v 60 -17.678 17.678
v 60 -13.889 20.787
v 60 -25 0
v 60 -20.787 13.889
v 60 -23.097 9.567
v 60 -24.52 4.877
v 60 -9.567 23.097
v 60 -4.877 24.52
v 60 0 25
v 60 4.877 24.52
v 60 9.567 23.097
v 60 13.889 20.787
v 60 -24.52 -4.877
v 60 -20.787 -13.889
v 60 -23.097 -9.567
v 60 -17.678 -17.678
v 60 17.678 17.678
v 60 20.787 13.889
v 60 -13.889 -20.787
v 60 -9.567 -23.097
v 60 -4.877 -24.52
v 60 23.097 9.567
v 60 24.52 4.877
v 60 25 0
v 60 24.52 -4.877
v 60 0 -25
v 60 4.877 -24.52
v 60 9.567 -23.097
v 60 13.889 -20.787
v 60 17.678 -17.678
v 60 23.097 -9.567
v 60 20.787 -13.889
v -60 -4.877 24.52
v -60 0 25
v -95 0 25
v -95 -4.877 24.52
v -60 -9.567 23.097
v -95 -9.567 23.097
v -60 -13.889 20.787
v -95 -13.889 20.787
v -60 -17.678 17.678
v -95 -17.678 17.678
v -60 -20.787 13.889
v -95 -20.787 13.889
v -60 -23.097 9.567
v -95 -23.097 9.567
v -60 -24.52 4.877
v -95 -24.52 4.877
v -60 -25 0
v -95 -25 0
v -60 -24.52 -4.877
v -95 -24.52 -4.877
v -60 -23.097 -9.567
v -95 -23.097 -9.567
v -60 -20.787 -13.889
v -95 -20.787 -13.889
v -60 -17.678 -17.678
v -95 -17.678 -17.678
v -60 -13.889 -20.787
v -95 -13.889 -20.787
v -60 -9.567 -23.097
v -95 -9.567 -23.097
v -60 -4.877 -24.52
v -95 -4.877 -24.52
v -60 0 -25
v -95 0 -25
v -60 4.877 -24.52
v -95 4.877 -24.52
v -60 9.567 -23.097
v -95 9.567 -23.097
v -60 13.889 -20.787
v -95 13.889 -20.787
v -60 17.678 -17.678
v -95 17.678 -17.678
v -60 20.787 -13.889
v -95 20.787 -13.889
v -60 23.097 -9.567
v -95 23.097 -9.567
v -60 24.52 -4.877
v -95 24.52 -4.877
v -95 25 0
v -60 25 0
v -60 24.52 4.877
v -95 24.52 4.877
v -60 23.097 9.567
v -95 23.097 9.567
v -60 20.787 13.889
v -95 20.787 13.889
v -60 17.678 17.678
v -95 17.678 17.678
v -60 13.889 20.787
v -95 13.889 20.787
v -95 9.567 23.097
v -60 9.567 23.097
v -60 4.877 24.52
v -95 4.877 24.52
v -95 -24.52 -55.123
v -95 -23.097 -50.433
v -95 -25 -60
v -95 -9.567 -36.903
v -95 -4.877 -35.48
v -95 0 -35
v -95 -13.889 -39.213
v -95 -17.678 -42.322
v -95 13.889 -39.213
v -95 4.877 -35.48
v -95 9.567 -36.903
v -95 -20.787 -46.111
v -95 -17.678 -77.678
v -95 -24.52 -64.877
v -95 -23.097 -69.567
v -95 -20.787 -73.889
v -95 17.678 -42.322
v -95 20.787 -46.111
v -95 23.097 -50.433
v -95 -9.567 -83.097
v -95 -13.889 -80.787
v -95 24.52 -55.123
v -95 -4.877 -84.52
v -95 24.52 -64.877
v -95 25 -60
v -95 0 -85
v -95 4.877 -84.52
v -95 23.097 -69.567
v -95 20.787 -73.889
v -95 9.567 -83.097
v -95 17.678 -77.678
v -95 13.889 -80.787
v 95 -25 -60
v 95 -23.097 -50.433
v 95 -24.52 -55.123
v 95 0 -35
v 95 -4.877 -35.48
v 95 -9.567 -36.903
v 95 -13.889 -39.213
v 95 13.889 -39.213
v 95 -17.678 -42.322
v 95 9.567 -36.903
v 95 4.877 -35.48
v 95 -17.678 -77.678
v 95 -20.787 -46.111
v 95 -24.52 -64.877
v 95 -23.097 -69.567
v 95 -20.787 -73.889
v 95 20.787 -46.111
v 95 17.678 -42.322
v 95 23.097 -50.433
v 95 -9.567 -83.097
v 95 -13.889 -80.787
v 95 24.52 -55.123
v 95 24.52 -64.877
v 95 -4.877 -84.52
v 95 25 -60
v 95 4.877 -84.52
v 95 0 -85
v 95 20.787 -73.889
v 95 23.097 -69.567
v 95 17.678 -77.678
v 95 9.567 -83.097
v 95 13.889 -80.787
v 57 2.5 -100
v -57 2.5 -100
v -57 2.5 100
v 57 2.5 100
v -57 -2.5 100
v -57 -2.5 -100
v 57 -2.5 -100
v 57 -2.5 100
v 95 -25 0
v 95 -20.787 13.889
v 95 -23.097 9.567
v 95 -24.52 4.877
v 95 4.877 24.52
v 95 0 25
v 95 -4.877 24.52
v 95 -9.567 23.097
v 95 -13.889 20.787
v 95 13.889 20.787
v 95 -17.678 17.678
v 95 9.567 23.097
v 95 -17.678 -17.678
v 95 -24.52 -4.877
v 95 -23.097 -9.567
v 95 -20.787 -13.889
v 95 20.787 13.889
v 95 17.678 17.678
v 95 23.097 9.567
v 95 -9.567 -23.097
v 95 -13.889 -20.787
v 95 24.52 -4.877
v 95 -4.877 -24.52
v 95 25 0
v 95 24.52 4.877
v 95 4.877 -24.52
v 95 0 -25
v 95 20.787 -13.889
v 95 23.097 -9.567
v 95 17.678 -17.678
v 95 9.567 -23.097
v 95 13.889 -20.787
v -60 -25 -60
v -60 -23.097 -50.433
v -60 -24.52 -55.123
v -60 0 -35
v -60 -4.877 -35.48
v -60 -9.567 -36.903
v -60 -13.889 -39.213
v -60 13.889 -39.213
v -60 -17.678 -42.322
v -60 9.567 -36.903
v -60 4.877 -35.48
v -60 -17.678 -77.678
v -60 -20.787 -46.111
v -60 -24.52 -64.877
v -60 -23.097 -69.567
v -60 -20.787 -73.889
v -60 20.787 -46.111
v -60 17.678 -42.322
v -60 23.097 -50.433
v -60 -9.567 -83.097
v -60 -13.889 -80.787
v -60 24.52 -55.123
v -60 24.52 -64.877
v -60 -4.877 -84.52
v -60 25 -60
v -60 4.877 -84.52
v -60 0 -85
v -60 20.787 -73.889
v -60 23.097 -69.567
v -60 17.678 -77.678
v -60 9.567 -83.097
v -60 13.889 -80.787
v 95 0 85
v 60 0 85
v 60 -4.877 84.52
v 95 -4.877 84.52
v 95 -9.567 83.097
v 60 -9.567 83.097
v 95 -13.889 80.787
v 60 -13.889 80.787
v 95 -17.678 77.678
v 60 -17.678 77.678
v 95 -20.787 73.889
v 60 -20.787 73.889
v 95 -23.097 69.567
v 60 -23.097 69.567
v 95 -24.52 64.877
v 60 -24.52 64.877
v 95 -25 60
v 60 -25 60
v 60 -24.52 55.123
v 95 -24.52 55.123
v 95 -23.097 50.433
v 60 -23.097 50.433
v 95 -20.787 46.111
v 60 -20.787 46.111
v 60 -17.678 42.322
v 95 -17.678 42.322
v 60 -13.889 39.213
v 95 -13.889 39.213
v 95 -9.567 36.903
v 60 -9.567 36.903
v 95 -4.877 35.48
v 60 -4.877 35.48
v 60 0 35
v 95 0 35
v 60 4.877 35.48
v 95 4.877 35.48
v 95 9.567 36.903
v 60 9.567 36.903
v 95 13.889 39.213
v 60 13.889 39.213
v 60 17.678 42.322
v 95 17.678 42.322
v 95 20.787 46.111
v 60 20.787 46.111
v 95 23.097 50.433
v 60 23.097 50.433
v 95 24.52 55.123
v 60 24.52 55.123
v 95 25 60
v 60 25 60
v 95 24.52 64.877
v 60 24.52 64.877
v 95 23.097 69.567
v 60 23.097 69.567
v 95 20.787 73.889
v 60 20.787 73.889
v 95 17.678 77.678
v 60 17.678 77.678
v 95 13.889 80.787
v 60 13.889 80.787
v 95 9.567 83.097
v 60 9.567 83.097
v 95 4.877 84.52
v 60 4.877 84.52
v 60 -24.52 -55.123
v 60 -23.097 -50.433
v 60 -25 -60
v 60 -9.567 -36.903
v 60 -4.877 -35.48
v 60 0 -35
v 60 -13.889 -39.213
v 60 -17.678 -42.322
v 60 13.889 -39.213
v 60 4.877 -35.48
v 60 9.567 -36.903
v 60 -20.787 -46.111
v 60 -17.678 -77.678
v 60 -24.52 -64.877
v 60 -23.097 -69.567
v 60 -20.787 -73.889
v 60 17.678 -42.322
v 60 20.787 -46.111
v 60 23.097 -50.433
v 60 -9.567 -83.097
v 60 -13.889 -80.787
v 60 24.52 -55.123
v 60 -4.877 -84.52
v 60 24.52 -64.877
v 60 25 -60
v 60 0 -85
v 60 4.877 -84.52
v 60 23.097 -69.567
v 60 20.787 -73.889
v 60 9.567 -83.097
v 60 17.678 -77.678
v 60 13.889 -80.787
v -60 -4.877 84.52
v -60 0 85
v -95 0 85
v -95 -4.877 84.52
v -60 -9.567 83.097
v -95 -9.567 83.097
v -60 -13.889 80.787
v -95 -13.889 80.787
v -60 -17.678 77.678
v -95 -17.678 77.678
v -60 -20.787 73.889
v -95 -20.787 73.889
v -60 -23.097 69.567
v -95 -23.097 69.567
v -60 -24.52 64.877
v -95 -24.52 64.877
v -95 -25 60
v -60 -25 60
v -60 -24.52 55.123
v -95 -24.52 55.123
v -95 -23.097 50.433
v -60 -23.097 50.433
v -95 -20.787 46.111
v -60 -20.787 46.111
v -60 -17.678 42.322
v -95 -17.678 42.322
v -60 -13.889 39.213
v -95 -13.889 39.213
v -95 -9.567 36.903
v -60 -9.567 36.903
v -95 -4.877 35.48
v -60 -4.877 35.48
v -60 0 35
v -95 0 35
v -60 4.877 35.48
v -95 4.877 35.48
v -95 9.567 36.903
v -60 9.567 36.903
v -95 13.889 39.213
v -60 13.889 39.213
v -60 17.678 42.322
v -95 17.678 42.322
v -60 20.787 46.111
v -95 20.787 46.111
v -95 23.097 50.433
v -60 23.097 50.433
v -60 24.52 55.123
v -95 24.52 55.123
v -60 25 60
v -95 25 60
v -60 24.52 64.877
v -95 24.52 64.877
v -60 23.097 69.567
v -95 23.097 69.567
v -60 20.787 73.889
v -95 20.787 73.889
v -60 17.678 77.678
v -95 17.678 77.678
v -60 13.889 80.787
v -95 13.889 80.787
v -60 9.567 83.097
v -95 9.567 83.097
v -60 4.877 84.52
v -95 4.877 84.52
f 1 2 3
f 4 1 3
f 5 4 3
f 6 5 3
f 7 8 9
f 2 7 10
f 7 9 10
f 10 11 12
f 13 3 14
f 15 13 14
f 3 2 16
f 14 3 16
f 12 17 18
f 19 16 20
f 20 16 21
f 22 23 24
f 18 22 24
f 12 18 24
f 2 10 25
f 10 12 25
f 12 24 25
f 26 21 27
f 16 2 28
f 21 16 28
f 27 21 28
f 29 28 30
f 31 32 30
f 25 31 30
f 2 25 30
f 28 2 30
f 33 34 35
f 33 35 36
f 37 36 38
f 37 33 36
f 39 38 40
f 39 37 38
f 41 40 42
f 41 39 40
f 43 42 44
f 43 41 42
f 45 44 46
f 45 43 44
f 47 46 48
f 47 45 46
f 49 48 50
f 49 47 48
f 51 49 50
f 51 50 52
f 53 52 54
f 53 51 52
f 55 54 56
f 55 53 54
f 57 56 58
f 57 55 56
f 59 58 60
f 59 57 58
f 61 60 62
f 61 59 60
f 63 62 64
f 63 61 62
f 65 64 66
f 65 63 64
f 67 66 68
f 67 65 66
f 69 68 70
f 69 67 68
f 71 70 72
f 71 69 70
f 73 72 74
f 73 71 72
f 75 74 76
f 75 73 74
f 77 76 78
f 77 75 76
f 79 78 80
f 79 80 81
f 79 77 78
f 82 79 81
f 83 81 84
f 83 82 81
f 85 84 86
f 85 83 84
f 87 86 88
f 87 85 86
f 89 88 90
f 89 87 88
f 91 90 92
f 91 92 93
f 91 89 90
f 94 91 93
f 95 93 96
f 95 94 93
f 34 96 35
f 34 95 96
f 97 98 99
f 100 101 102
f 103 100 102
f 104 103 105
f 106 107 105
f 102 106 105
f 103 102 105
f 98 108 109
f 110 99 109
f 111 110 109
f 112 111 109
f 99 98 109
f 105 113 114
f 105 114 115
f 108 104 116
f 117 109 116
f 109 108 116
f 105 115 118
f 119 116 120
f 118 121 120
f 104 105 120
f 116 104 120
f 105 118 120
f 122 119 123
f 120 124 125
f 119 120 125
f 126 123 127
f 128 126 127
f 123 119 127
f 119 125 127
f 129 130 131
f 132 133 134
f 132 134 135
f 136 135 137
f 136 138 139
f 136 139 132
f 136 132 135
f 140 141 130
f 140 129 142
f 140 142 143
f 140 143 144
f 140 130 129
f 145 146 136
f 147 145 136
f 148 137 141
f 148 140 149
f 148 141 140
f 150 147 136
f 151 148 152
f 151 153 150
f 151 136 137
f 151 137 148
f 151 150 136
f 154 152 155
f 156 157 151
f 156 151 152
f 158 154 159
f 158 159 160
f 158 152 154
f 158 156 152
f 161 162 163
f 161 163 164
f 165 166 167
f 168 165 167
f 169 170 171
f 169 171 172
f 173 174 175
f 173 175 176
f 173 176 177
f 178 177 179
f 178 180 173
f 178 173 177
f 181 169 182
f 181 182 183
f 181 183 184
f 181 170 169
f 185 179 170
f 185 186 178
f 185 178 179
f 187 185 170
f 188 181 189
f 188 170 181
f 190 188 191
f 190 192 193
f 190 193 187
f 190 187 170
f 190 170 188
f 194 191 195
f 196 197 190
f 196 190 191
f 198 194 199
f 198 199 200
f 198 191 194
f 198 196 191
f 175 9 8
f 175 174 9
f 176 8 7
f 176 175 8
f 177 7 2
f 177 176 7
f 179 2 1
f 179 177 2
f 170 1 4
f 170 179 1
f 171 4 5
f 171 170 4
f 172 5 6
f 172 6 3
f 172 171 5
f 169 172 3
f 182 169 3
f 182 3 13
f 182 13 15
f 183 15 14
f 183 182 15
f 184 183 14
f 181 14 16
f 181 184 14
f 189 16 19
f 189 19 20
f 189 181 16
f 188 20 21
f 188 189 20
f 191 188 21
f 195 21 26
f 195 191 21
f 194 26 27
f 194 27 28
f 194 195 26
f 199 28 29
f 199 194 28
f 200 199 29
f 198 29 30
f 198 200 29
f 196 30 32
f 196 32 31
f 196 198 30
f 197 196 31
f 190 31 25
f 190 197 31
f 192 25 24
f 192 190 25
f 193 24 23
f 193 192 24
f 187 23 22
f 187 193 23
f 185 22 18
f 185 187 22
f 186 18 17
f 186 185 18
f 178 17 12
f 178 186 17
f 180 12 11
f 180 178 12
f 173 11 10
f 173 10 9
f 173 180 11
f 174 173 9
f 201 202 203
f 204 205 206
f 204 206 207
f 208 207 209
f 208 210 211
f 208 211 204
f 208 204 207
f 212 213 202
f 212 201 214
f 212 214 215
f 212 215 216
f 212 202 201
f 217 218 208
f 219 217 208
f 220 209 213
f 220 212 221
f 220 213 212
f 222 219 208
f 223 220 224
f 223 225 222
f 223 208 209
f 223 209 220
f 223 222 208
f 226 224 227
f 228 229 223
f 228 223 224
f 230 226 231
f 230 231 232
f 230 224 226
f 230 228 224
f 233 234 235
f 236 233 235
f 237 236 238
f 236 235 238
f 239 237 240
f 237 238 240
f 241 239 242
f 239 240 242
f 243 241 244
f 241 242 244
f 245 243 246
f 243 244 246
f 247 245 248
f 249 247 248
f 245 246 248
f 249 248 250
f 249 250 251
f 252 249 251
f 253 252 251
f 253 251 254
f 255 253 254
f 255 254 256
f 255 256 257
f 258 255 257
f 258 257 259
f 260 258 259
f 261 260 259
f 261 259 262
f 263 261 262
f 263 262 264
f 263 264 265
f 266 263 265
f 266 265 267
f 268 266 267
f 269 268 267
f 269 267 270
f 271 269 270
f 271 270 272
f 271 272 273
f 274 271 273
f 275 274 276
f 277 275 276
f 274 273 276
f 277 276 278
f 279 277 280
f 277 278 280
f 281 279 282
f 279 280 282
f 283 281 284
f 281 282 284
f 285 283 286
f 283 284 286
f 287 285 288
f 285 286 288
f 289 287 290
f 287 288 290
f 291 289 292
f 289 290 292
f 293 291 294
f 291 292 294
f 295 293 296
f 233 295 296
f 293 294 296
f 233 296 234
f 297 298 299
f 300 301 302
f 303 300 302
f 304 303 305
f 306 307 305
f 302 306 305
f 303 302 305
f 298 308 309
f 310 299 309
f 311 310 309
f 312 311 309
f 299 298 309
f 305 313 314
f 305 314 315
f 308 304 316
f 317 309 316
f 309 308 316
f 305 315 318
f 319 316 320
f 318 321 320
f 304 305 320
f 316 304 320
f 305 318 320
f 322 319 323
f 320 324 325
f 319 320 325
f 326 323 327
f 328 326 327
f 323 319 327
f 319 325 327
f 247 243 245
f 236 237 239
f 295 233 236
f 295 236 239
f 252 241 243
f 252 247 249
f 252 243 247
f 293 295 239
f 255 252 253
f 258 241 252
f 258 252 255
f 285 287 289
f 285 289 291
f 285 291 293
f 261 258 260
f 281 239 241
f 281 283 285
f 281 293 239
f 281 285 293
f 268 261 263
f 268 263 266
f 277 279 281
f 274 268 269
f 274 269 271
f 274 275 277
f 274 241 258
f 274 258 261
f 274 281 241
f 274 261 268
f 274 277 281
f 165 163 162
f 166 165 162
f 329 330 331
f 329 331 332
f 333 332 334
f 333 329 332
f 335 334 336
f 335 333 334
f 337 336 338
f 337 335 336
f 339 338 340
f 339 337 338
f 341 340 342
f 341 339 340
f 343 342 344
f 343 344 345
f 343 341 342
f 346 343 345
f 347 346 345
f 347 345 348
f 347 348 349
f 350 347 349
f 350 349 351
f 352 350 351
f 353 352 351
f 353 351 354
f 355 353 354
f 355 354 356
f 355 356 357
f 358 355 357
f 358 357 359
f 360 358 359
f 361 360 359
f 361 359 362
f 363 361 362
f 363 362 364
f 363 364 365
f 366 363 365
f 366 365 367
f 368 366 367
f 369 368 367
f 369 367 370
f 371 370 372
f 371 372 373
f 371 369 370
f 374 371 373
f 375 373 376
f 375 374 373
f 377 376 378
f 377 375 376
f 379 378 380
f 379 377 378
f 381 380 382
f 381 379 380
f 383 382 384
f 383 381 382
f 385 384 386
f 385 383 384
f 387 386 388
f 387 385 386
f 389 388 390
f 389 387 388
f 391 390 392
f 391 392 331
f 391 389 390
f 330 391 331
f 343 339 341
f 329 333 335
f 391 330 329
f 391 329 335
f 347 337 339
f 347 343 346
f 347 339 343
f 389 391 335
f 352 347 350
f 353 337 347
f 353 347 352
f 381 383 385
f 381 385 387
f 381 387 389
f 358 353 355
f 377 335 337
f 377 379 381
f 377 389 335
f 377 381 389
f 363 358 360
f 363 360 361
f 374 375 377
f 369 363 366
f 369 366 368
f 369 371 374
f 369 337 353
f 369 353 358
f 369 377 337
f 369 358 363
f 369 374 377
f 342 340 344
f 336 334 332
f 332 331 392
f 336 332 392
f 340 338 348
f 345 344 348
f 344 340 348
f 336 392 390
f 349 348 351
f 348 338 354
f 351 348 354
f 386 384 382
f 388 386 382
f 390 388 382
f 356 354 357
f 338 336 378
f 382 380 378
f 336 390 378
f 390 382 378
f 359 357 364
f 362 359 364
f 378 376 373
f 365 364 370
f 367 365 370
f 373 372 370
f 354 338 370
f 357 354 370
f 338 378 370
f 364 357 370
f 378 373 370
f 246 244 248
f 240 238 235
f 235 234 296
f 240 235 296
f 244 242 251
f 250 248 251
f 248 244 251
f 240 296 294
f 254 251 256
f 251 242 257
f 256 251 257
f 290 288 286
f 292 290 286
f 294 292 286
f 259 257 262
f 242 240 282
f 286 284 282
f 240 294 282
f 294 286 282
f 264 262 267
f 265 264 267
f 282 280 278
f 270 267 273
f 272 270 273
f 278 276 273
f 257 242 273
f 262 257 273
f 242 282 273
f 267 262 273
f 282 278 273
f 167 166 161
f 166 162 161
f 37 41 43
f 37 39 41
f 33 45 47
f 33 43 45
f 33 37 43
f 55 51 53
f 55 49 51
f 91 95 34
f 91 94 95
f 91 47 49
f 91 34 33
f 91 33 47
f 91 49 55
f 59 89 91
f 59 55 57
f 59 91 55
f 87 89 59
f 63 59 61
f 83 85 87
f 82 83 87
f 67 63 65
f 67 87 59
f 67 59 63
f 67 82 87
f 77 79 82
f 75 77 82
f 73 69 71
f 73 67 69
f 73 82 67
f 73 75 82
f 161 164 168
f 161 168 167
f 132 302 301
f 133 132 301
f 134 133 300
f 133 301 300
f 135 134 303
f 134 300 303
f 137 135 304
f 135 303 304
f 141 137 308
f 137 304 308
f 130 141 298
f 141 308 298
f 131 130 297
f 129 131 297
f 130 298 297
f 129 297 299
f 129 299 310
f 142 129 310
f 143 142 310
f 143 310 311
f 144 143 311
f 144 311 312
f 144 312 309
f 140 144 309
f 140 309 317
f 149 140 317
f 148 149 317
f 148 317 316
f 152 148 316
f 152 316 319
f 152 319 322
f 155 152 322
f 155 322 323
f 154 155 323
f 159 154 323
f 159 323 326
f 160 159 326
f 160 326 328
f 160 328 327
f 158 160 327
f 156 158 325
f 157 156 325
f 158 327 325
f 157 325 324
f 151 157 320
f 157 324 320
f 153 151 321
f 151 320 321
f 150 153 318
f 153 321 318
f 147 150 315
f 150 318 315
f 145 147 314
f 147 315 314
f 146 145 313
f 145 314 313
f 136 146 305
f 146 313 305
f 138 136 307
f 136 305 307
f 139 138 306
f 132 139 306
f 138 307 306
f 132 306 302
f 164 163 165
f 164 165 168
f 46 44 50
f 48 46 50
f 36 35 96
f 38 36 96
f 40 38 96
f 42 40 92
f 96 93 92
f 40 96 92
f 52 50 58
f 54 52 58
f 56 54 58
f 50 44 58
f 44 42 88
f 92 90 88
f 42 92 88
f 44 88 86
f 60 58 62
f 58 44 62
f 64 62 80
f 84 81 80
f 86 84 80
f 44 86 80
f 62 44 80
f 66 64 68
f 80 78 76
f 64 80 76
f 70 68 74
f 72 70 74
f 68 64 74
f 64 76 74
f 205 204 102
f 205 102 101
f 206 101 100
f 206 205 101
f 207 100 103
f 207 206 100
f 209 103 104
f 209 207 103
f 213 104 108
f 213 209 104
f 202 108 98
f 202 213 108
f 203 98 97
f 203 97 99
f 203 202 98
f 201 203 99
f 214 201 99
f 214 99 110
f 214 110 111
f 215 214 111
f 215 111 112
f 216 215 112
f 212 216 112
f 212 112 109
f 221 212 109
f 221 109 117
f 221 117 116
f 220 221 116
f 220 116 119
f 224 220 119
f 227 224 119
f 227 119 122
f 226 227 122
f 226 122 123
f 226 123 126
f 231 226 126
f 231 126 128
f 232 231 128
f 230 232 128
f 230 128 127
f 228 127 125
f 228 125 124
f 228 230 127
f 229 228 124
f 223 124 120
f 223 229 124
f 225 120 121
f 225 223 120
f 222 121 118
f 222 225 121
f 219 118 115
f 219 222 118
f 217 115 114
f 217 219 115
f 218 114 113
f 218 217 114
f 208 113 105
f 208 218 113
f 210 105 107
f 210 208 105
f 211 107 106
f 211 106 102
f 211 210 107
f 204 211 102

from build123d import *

# Parameters (mm, degrees)
SKETCH3_R             = 25
BOSS_EXTRUDE1_DEPTH   = 95
BOSS_EXTRUDE1_2_DEPTH = 95
BOSS_EXTRUDE1_3_DEPTH = 95
SKETCH3_3_R           = 25
CUT_EXTRUDE1_DEPTH    = 60
SKETCH4_W             = 114
SKETCH4_H             = 200
BOSS_EXTRUDE2_DEPTH   = 2.5


with BuildPart() as part:
    # Sketch3 → Boss-Extrude1 (new, symmetric)
    with BuildSketch(Plane(origin=(0, 0, 0), x_dir=(0, 0, -1), z_dir=(1, 0, 0))):
        with Locations((-60, 0)):
            Circle(SKETCH3_R)
    extrude(amount=BOSS_EXTRUDE1_DEPTH, both=True)


with BuildPart() as body_2:
    # Sketch3 → Boss-Extrude1 2 (new, symmetric)
    with BuildSketch(Plane(origin=(0, 0, 0), x_dir=(0, 0, -1), z_dir=(1, 0, 0))):
        with Locations((60, 0)):
            Circle(SKETCH3_R)
    extrude(amount=BOSS_EXTRUDE1_2_DEPTH, both=True)


with BuildPart() as body_3:
    # Sketch3 → Boss-Extrude1 3 (new, symmetric)
    with BuildSketch(Plane(origin=(0, 0, 0), x_dir=(0, 0, -1), z_dir=(1, 0, 0))):
        Circle(SKETCH3_R)
    extrude(amount=BOSS_EXTRUDE1_3_DEPTH, both=True)


with BuildPart() as cut_extrude1_tool:
    # Sketch3<3> → Cut-Extrude1 (new, symmetric)
    with BuildSketch(Plane(origin=(0, 0, 0), x_dir=(0, 0, -1), z_dir=(1, 0, 0))):
        with Locations((-60, 0)):
            Circle(SKETCH3_3_R)
        with Locations((60, 0)):
            Circle(SKETCH3_3_R)
        Circle(SKETCH3_3_R)
    extrude(amount=CUT_EXTRUDE1_DEPTH, both=True)


with BuildPart() as part_1:
    add(part.part)

    # Cut-Extrude1: cut by cut_extrude1_tool
    add(cut_extrude1_tool.part, mode=Mode.SUBTRACT)


with BuildPart() as body_2_1:
    add(body_2.part)

    # Cut-Extrude1: cut by cut_extrude1_tool
    add(cut_extrude1_tool.part, mode=Mode.SUBTRACT)


with BuildPart() as body_3_1:
    add(body_3.part)

    # Cut-Extrude1: cut by cut_extrude1_tool
    add(cut_extrude1_tool.part, mode=Mode.SUBTRACT)


with BuildPart() as cut_extrude1_piece_1:
    # of the separate pieces the step leaves, piece 1, a body of its own (cut_extrude1_pieces)
    add(part_1.part.solids().sort_by_distance((-95, 0, 35))[0])


with BuildPart() as cut_extrude1_piece_2:
    # of the separate pieces the step leaves, piece 2, a body of its own (cut_extrude1_pieces)
    add(part_1.part.solids().sort_by_distance((60, 0, 35))[0])


with BuildPart() as cut_extrude1_piece_1_of_body_2:
    # of the separate pieces the step leaves, piece 1, a body of its own (cut_extrude1_pieces_of_body_2)
    add(body_2_1.part.solids().sort_by_distance((-95, 0, -85))[0])


with BuildPart() as cut_extrude1_piece_2_of_body_2:
    # of the separate pieces the step leaves, piece 2, a body of its own (cut_extrude1_pieces_of_body_2)
    add(body_2_1.part.solids().sort_by_distance((60, 0, -85))[0])


with BuildPart() as cut_extrude1_piece_1_of_body_3:
    # of the separate pieces the step leaves, piece 1, a body of its own (cut_extrude1_pieces_of_body_3)
    add(body_3_1.part.solids().sort_by_distance((-95, 0, -25))[0])


with BuildPart() as cut_extrude1_piece_2_of_body_3:
    # of the separate pieces the step leaves, piece 2, a body of its own (cut_extrude1_pieces_of_body_3)
    add(body_3_1.part.solids().sort_by_distance((60, 0, -25))[0])


with BuildPart() as body_7:
    # Sketch4 → Boss-Extrude2 (new, symmetric)
    with BuildSketch(Plane(origin=(0, 0, 0), x_dir=(1, 0, 0), z_dir=(0, 1, 0))):
        Rectangle(SKETCH4_W, SKETCH4_H)
    extrude(amount=BOSS_EXTRUDE2_DEPTH, both=True)


solid = Compound([cut_extrude1_piece_1.part, cut_extrude1_piece_2.part, cut_extrude1_piece_1_of_body_2.part, cut_extrude1_piece_2_of_body_2.part, cut_extrude1_piece_1_of_body_3.part, cut_extrude1_piece_2_of_body_3.part, body_7.part])
